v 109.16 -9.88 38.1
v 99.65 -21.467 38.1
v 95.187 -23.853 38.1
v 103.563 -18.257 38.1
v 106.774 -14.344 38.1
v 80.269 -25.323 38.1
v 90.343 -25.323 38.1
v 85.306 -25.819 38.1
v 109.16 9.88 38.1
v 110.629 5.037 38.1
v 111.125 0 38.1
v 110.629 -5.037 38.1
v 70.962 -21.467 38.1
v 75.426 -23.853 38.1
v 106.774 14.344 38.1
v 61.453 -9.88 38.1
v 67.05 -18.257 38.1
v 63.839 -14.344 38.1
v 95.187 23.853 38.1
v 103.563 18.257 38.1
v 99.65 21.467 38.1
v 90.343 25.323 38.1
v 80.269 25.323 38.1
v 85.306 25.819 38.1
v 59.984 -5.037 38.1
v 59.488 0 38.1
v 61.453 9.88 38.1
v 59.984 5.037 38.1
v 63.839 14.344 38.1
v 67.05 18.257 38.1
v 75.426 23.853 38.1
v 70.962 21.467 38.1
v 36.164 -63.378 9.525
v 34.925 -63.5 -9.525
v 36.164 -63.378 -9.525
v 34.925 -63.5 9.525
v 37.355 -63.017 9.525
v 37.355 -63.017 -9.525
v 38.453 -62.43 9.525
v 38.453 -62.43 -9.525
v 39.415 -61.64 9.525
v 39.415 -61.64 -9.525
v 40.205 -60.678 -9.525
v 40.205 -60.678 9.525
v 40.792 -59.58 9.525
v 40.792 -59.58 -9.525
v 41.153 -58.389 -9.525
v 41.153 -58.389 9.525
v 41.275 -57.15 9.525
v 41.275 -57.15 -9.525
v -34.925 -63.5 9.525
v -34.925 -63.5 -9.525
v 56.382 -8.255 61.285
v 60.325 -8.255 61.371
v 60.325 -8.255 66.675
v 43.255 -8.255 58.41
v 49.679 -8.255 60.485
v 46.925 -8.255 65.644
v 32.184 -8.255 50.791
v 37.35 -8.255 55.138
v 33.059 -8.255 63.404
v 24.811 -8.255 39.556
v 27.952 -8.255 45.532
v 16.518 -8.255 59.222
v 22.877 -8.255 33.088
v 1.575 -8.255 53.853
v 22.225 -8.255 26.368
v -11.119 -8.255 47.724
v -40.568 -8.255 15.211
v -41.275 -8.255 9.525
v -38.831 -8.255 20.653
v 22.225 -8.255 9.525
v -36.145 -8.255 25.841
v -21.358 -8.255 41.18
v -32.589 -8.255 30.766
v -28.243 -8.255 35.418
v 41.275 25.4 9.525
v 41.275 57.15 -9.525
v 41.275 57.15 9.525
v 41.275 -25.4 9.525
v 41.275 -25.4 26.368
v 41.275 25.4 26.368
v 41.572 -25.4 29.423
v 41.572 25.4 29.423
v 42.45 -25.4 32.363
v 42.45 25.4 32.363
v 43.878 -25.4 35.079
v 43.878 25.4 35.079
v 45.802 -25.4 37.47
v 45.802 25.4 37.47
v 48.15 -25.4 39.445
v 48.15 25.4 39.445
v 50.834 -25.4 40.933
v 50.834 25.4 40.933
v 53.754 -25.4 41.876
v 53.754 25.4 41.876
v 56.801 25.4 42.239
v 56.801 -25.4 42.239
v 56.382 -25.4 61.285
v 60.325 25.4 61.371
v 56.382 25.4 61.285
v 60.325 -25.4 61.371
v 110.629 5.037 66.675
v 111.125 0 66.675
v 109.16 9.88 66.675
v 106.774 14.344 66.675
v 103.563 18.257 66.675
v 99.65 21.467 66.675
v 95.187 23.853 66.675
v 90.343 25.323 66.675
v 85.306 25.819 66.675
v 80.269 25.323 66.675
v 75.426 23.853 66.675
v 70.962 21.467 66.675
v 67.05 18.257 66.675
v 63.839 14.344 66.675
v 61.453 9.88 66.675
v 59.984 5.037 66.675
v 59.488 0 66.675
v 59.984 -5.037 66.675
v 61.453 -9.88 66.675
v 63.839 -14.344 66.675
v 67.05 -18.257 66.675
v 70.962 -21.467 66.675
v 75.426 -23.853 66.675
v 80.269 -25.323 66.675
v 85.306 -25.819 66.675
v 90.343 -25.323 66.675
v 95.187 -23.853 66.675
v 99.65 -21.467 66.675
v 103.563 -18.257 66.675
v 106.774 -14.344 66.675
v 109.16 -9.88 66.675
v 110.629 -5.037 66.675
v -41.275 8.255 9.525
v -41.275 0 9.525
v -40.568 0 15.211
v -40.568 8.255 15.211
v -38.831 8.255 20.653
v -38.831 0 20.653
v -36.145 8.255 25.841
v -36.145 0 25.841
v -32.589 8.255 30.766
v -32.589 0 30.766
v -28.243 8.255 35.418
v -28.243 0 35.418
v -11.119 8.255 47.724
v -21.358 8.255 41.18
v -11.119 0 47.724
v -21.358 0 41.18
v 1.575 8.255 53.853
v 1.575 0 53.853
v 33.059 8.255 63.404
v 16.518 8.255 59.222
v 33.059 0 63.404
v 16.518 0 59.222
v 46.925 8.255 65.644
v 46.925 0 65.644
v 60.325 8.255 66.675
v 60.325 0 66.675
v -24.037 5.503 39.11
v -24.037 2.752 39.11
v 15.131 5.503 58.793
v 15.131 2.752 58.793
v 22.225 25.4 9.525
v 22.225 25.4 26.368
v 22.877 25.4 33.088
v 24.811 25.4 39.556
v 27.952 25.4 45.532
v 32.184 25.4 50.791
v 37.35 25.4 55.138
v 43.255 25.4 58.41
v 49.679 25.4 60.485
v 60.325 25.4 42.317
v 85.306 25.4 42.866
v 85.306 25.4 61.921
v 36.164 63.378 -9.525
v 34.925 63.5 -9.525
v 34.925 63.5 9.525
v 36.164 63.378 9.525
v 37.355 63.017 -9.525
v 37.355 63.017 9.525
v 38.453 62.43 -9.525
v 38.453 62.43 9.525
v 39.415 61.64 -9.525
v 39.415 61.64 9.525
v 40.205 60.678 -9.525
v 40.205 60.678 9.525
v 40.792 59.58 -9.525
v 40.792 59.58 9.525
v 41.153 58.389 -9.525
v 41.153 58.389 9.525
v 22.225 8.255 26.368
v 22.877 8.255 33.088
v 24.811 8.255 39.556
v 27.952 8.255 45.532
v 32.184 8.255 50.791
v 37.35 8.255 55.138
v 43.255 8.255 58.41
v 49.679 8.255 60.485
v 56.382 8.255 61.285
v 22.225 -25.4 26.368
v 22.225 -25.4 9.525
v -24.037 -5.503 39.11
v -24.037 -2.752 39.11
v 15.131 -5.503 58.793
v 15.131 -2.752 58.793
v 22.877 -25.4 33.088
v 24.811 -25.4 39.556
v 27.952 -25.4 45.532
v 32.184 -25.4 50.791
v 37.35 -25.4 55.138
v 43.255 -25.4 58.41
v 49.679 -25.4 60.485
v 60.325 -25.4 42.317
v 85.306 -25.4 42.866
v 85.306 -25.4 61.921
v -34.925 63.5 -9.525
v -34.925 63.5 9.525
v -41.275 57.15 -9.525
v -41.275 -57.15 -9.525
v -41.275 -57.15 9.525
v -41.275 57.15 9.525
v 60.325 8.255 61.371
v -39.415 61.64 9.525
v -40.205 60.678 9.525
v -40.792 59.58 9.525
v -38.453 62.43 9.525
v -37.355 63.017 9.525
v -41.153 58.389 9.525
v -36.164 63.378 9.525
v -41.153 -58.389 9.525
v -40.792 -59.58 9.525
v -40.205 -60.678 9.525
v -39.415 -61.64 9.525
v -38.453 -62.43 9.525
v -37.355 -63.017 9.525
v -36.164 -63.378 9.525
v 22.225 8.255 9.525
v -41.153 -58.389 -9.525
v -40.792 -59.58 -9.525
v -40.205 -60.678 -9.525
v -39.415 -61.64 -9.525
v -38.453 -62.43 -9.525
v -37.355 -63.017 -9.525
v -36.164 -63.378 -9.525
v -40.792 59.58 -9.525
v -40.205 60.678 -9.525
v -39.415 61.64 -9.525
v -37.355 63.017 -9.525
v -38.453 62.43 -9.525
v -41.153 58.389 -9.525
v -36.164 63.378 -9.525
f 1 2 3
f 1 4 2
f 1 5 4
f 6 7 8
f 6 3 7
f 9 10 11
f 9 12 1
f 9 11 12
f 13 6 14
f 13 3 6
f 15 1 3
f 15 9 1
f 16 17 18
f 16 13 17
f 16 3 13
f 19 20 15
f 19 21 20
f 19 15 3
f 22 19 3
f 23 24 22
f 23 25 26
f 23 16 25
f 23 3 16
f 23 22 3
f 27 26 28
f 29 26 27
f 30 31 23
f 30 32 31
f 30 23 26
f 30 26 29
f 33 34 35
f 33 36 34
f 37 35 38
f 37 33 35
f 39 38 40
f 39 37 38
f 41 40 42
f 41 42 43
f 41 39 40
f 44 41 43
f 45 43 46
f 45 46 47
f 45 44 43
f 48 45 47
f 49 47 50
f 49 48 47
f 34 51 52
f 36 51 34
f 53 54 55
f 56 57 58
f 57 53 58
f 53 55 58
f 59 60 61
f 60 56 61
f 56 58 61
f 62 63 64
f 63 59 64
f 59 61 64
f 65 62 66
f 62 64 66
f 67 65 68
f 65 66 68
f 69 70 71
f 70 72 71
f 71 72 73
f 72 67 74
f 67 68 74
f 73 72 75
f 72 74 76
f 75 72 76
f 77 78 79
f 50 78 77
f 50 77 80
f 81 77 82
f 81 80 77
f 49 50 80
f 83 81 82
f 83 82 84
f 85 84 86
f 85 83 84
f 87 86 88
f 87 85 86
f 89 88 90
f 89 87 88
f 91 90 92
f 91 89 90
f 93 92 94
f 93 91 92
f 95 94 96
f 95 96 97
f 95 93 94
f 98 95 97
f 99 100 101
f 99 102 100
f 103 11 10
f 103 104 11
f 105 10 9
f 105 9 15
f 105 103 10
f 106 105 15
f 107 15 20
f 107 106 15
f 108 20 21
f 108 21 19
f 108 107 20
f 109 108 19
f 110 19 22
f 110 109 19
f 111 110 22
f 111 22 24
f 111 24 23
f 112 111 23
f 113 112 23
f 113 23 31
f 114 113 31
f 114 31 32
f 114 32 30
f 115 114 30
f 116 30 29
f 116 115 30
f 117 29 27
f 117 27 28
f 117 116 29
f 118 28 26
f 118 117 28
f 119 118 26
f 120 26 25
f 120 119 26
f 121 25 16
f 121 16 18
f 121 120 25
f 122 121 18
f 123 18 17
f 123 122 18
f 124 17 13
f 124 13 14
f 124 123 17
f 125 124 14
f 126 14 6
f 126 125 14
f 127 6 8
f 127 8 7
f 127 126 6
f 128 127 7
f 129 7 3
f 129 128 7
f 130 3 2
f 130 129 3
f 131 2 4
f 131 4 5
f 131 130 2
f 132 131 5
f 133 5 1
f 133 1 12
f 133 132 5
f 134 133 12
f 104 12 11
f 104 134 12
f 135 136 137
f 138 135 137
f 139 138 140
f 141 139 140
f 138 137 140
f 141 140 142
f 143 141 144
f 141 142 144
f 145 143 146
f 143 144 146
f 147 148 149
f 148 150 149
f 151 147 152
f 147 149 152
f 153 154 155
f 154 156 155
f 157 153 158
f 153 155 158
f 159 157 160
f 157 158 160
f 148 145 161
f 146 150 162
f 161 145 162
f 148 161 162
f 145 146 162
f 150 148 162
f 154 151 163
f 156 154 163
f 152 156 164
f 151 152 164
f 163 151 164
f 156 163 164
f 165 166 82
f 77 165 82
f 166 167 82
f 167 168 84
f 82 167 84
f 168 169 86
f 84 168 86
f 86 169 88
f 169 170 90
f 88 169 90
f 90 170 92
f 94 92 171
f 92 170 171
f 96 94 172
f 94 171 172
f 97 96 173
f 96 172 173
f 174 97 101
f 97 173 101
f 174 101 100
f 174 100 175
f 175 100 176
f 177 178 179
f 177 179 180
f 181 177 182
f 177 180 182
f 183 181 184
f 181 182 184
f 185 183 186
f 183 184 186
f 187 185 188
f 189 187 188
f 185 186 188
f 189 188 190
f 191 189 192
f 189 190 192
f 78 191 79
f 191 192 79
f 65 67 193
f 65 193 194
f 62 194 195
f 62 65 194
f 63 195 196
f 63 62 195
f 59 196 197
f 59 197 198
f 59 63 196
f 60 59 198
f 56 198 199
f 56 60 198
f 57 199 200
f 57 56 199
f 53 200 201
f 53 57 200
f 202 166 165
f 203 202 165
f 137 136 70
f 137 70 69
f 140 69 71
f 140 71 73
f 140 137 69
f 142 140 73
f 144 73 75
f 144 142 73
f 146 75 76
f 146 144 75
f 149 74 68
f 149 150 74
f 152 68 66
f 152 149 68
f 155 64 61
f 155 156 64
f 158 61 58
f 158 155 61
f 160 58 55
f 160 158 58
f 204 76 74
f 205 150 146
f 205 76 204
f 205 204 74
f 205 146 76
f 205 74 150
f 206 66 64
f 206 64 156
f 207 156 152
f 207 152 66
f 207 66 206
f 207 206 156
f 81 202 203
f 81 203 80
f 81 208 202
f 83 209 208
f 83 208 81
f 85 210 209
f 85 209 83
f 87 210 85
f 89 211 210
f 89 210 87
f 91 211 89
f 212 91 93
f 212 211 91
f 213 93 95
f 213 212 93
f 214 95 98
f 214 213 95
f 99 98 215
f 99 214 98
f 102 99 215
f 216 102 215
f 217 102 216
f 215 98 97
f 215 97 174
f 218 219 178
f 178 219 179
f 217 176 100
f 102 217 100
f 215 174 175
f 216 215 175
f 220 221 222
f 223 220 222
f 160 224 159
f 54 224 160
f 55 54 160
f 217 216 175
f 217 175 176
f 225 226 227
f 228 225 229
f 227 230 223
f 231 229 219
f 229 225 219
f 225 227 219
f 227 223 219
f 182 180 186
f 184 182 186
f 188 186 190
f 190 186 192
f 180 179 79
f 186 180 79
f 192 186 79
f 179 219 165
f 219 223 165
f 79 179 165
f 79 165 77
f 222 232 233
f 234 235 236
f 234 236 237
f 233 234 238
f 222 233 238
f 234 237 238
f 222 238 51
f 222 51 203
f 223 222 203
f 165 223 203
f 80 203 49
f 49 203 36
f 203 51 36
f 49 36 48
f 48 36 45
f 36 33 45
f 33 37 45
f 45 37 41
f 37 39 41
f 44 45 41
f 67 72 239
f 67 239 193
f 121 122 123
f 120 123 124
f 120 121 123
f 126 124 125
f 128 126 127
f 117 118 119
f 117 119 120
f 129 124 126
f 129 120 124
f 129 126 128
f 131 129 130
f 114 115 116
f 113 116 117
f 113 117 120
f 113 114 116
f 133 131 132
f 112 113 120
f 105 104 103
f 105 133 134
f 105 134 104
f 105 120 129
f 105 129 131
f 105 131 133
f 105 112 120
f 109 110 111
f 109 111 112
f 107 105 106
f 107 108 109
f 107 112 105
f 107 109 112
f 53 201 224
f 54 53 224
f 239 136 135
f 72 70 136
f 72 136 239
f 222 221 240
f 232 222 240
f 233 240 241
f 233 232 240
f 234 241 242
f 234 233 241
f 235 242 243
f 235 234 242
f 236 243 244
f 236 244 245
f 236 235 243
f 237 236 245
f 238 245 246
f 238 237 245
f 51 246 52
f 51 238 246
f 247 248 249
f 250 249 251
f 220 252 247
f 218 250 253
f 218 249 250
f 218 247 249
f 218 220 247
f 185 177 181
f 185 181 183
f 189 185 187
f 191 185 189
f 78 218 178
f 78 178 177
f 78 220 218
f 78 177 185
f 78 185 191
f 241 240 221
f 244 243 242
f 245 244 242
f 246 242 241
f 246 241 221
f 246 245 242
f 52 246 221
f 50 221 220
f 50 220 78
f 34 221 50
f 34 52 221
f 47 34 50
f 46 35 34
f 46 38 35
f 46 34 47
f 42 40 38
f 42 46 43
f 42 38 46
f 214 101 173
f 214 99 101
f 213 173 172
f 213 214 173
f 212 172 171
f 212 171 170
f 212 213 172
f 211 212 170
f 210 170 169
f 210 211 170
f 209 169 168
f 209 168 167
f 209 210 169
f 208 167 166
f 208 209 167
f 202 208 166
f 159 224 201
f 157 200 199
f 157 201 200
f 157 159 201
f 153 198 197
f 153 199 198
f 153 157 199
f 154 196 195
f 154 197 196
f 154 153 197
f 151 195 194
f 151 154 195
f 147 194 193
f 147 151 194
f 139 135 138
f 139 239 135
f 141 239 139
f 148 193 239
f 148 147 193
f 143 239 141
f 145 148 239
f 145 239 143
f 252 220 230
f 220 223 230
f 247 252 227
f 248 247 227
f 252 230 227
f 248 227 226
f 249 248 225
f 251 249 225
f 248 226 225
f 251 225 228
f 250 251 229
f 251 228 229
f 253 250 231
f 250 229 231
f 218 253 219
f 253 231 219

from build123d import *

# Parameters (mm, degrees)
F1_W     = 82.55
F1_H     = 19.05
F2_DEPTH = 63.5
F3_DEPTH = 25.4
F4_DEPTH = 8.255
F6_R     = 6.35


with BuildPart() as f2:
    # F1 (on Front) → F2 (new body, symmetric)
    with BuildSketch(Plane.XZ):
        Rectangle(F1_W, F1_H)
    extrude(amount=F2_DEPTH, both=True)

    # F0 (on Front) → F3 (join, symmetric)
    with BuildSketch(Plane.XZ):
        with BuildLine():
            Line((22.225, 26.3682509312), (22.225, 9.525))
            Line((22.225, 9.525), (41.275, 9.525))
            Line((41.275, 9.525), (41.275, 26.3682509312))
            ThreePointArc((41.275, 26.3682509312), (45.8020066403, 37.4695423744), (56.8011318686, 42.2394171148))
            Line((56.8011318686, 42.2394171148), (60.325, 42.3168761544))
            Line((60.325, 42.3168761544), (60.325, 61.3714778454))
            Line((60.325, 61.3714778454), (56.382490111, 61.2848165351))
            ThreePointArc((56.382490111, 61.2848165351), (32.1844146086, 50.7910921063), (22.225, 26.3682509312))
        make_face()
        Polygon((85.3063582423, 61.9205994203), (60.325, 61.3714778454), (60.325, 42.3168761544), (85.3063582423, 42.8659977293), align=None)
    extrude(amount=F3_DEPTH, both=True)

    # F6
    f6_edges = [f2.edges().sort_by_distance(p)[0] for p in [
        (-41.275, -63.5, 0),
        (41.275, -63.5, 0),
        (41.275, 63.5, 0),
        (-41.275, 63.5, 0),
    ]]
    fillet(f6_edges, radius=F6_R)


with BuildPart() as f4:
    # F0 (on Front) → F4 (new body, symmetric)
    with BuildSketch(Plane.XZ):
        with BuildLine():
            add(Edge.make_bspline(
                [(-41.275, 9.525), (-40.304647513, 43.4288604094), (17.420032993, 65.3251186013), (60.325, 66.675)],
                knots=[0, 0, 0, 0, 116.5705044169, 116.5705044169, 116.5705044169, 116.5705044169], degree=3))
            Line((-41.275, 9.525), (22.225, 9.525))
            Line((22.225, 9.525), (22.225, 26.3682509312))
            ThreePointArc((22.225, 26.3682509312), (32.1844146086, 50.7910921063), (56.382490111, 61.2848165351))
            Line((56.382490111, 61.2848165351), (60.325, 61.3714778454))
            Line((60.325, 61.3714778454), (60.325, 66.675))
        make_face()
    extrude(amount=F4_DEPTH, both=True)


with BuildPart() as f5:
    # F0 (on Front) → F5 (revolve)
    with BuildSketch(Plane.XZ):
        Polygon((111.125, 66.675), (85.3063582423, 66.675), (85.3063582423, 61.9205994203), (85.3063582423, 42.8659977293), (85.3063582423, 38.1), (111.125, 38.1), align=None)
    revolve(axis=Axis((85.3063582423, 0, 52.3875), (0, 0, 1)))


solid = Compound([f2.part, f4.part, f5.part])
